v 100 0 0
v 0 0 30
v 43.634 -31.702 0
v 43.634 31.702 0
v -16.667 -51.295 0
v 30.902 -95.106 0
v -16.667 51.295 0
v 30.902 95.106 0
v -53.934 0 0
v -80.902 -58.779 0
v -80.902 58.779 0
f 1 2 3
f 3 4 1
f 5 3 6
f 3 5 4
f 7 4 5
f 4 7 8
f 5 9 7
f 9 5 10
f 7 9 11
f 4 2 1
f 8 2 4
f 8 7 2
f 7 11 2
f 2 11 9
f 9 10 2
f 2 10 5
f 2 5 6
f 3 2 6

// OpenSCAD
k=5;//[3:1:20]
alpha=360/k;
high=30;//[1:1:100]
r1=50;//[1:1:100]
r2=100;//[1:1:100]
for (i=[0:alpha:360]){
rotate(a=i,v=[0,0,1]){
polyhedron(
points=[[0,0,0],[0,0,high],[r1*cos(alpha),r1*sin(alpha),0],[r2,0,0],[r1*cos(alpha),-r1*sin(alpha),0]],
faces=[[0,1,4],[0,2,1],[1,3,4],[1,2,3],[0,4,2],[4,3,2]]
);
  }
    }
